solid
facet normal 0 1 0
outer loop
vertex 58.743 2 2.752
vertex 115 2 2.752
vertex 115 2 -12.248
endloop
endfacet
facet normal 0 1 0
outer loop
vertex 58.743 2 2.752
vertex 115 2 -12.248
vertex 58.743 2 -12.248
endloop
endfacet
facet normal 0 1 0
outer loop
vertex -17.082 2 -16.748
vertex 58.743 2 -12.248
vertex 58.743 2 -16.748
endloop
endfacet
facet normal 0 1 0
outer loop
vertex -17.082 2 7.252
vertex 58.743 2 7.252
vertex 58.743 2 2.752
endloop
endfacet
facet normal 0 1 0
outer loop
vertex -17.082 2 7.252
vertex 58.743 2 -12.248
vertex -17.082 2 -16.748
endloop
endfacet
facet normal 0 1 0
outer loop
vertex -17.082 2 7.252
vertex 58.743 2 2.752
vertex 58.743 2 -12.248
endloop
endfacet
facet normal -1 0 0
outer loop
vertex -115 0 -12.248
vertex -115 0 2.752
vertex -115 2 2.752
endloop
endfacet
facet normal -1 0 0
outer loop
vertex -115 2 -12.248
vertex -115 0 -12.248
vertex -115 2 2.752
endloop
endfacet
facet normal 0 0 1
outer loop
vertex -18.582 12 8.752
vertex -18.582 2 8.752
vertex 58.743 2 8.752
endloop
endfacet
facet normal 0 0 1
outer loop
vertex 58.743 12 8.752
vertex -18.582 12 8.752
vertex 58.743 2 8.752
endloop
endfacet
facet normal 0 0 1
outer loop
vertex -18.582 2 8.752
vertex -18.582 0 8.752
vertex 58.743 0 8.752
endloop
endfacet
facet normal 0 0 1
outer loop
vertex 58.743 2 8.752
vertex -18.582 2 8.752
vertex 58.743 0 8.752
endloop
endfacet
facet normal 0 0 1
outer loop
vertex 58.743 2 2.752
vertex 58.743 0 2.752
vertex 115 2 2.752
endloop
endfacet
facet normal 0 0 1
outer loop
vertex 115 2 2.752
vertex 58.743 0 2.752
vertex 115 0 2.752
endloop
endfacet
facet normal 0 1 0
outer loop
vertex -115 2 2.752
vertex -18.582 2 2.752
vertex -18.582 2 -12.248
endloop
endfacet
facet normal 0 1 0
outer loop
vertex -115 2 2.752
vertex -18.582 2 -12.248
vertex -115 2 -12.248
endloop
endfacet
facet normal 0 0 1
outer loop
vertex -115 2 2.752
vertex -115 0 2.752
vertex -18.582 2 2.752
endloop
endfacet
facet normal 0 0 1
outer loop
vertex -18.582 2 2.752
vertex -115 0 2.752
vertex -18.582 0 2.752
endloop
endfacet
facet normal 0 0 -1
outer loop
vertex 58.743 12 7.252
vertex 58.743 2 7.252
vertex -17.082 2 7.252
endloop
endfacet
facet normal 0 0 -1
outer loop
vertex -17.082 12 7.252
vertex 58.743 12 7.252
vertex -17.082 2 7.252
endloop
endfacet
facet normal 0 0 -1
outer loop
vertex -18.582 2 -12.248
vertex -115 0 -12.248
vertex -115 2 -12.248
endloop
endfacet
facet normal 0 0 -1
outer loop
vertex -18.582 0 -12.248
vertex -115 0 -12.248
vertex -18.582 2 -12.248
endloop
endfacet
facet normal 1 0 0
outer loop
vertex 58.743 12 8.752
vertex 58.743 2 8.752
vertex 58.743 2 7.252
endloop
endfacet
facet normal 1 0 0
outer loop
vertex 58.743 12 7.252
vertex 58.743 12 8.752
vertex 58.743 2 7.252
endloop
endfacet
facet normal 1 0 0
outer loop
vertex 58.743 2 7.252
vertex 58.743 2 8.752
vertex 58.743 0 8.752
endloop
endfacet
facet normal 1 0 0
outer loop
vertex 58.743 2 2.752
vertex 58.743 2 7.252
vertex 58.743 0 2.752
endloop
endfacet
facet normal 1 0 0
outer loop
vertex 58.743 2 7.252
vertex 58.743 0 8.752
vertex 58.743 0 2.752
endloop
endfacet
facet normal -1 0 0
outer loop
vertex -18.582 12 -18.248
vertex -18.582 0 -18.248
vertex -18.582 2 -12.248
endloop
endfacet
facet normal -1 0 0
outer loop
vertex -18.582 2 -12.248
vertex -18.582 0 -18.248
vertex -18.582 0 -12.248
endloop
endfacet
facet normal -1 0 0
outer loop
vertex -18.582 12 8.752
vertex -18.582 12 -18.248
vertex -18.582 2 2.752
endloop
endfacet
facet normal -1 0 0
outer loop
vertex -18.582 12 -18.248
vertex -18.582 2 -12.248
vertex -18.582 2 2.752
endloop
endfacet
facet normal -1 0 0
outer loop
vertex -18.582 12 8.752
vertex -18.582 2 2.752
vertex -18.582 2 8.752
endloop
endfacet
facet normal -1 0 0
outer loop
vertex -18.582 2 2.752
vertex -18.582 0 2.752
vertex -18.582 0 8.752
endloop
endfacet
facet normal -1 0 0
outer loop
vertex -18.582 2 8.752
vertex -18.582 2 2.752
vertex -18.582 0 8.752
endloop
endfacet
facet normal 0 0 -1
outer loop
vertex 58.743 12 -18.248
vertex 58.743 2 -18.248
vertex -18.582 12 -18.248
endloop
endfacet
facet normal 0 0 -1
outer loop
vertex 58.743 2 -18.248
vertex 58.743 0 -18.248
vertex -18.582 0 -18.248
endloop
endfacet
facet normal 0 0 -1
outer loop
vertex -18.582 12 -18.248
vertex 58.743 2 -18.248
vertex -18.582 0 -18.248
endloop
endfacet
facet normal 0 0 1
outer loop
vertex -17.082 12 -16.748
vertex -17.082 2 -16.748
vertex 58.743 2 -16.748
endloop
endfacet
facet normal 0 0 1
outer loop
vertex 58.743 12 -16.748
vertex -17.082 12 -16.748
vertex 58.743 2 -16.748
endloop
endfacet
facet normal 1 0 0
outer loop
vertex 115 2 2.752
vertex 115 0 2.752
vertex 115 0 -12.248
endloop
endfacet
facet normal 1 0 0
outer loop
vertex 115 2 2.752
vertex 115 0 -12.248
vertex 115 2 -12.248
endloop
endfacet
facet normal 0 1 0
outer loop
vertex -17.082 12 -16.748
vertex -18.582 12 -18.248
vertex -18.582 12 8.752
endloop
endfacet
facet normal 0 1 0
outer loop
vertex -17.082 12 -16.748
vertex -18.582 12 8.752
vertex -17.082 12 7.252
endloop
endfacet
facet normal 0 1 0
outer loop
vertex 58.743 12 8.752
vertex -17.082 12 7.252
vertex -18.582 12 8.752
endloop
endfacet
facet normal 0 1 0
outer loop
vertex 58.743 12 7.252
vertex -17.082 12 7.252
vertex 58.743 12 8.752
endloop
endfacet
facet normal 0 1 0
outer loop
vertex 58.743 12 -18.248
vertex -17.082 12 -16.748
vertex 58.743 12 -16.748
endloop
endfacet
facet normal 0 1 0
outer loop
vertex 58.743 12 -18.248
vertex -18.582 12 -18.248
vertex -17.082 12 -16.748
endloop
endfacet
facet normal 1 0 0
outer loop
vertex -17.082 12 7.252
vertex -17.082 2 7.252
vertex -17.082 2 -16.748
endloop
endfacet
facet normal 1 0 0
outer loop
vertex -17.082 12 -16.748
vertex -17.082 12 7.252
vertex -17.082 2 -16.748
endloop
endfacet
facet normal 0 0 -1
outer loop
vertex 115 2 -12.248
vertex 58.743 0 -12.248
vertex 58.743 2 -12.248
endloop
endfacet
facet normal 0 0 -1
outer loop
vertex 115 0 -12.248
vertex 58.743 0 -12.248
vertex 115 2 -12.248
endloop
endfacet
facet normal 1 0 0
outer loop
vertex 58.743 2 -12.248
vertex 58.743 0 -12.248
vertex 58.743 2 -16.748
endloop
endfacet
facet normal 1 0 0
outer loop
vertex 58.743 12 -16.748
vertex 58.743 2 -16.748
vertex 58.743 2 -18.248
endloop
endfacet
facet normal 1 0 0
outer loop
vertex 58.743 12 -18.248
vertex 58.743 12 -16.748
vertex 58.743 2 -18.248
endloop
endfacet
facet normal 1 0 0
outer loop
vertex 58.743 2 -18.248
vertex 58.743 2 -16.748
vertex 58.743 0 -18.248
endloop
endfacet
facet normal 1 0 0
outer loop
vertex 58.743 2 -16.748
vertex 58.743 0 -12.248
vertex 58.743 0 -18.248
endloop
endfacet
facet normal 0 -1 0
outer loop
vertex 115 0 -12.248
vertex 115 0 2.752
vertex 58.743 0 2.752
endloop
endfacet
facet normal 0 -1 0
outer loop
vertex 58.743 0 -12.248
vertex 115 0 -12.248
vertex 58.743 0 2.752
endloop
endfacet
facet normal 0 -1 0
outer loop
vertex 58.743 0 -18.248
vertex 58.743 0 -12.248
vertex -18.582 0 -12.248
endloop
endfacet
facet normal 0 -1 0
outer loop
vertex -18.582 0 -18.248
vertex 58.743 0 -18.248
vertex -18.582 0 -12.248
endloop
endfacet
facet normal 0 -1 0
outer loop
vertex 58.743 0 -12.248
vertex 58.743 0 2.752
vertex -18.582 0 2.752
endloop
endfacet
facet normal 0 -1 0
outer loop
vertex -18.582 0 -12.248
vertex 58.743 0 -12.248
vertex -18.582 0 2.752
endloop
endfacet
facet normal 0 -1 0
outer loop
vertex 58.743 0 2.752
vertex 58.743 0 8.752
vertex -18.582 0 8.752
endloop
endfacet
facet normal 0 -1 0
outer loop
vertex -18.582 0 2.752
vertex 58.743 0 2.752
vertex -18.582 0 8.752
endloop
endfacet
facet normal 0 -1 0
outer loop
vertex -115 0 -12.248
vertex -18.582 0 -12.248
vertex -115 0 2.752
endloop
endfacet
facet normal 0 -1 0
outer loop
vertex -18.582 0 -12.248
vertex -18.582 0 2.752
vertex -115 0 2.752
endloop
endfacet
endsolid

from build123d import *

# Parameters (mm, degrees)
CROQUIS1_W                   = 230
CROQUIS1_H                   = 15
SALIENTE_EXTRUIR1_DEPTH      = 2
CROQUIS2_W                   = 45
CROQUIS2_H                   = 22
SALIENTE_EXTRUIR2_DEPTH      = 5
CROQUIS3_W                   = 45
CROQUIS3_H                   = 22
SALIENTE_EXTRUIR3_DEPTH      = 5
SALIENTE_EXTRUIR4_DEPTH      = 6
SALIENTE_EXTRUIR4_DEPTH_BACK = 21
CROQUIS6_W                   = 77.325066443
CROQUIS6_H                   = 2
SALIENTE_EXTRUIR5_DEPTH      = 10
CORTAR_EXTRUIR1_REACH        = 130.721
CROQUIS9_W                   = 5
CROQUIS9_H                   = 22


with BuildPart() as part:
    # Croquis1 → Saliente-Extruir1 (new body)
    with BuildSketch(Plane(origin=(0, 0, 0), x_dir=(1, 0, 0), z_dir=(0, 1, 0))):
        with Locations((0, 4.747757848)):
            Rectangle(CROQUIS1_W, CROQUIS1_H)
    extrude(amount=SALIENTE_EXTRUIR1_DEPTH)

    # Croquis2 → Saliente-Extruir2 (add)
    with BuildSketch(Plane(origin=(115, 0, 0), x_dir=(0, 0, -1), z_dir=(1, 0, 0))):
        with Locations((4.747757848, 1)):
            Rectangle(CROQUIS2_W, CROQUIS2_H)
    extrude(amount=SALIENTE_EXTRUIR2_DEPTH)

    # Croquis3 → Saliente-Extruir3 (add)
    with BuildSketch(Plane.ZY.offset(115)):
        with Locations((-4.747757848, 1)):
            Rectangle(CROQUIS3_W, CROQUIS3_H)
    extrude(amount=SALIENTE_EXTRUIR3_DEPTH)

    # Croquis6 → Saliente-Extruir4 (add, two sides: drawn at the far end of the back side and taken through both)
    with BuildSketch(Plane(origin=(0, 0, -12.247757848), x_dir=(-1, 0, 0), z_dir=(0, 0, -1)).offset(-SALIENTE_EXTRUIR4_DEPTH_BACK)):
        with Locations((-20.080179861, 1)):
            Rectangle(CROQUIS6_W, CROQUIS6_H)
    extrude(amount=SALIENTE_EXTRUIR4_DEPTH + SALIENTE_EXTRUIR4_DEPTH_BACK)

    # Croquis7 → Saliente-Extruir5 (add)
    with BuildSketch(Plane(origin=(0, 2, 0), x_dir=(1, 0, 0), z_dir=(0, 1, 0))):
        Polygon((-18.58235336, 18.247757848), (-18.58235336, -8.752242152), (58.742713083, -8.752242152), (58.742713083, -7.252242152), (-17.08235336, -7.252242152), (-17.08235336, 16.747757848), (58.742713083, 16.747757848), (58.742713083, 18.247757848), align=None)
    extrude(amount=SALIENTE_EXTRUIR5_DEPTH)

    # Croquis9 → Cortar-Extruir1 (cut, up to next)
    with BuildSketch(Plane.XY.offset(17.752242152), mode=Mode.PRIVATE) as cortar_extruir1_sk1:
        with Locations((-117.5, 1)):
            Rectangle(CROQUIS9_W, CROQUIS9_H)
    cortar_extruir1_tool1 = extrude(cortar_extruir1_sk1.sketch, amount=-CORTAR_EXTRUIR1_REACH, mode=Mode.PRIVATE) & part.part
    # Croquis9 → Cortar-Extruir1 (cut, up to next)
    with BuildSketch(Plane.XY.offset(17.752242152), mode=Mode.PRIVATE) as cortar_extruir1_sk2:
        with Locations((117.5, 1)):
            Rectangle(CROQUIS9_W, CROQUIS9_H)
    cortar_extruir1_tool2 = extrude(cortar_extruir1_sk2.sketch, amount=-CORTAR_EXTRUIR1_REACH, mode=Mode.PRIVATE) & part.part
    add(cortar_extruir1_tool1.solids().sort_by_distance((-117.5, 1, 17.752242))[0], mode=Mode.SUBTRACT)
    add(cortar_extruir1_tool2.solids().sort_by_distance((117.5, 1, 17.752242))[0], mode=Mode.SUBTRACT)


solid = part.part
